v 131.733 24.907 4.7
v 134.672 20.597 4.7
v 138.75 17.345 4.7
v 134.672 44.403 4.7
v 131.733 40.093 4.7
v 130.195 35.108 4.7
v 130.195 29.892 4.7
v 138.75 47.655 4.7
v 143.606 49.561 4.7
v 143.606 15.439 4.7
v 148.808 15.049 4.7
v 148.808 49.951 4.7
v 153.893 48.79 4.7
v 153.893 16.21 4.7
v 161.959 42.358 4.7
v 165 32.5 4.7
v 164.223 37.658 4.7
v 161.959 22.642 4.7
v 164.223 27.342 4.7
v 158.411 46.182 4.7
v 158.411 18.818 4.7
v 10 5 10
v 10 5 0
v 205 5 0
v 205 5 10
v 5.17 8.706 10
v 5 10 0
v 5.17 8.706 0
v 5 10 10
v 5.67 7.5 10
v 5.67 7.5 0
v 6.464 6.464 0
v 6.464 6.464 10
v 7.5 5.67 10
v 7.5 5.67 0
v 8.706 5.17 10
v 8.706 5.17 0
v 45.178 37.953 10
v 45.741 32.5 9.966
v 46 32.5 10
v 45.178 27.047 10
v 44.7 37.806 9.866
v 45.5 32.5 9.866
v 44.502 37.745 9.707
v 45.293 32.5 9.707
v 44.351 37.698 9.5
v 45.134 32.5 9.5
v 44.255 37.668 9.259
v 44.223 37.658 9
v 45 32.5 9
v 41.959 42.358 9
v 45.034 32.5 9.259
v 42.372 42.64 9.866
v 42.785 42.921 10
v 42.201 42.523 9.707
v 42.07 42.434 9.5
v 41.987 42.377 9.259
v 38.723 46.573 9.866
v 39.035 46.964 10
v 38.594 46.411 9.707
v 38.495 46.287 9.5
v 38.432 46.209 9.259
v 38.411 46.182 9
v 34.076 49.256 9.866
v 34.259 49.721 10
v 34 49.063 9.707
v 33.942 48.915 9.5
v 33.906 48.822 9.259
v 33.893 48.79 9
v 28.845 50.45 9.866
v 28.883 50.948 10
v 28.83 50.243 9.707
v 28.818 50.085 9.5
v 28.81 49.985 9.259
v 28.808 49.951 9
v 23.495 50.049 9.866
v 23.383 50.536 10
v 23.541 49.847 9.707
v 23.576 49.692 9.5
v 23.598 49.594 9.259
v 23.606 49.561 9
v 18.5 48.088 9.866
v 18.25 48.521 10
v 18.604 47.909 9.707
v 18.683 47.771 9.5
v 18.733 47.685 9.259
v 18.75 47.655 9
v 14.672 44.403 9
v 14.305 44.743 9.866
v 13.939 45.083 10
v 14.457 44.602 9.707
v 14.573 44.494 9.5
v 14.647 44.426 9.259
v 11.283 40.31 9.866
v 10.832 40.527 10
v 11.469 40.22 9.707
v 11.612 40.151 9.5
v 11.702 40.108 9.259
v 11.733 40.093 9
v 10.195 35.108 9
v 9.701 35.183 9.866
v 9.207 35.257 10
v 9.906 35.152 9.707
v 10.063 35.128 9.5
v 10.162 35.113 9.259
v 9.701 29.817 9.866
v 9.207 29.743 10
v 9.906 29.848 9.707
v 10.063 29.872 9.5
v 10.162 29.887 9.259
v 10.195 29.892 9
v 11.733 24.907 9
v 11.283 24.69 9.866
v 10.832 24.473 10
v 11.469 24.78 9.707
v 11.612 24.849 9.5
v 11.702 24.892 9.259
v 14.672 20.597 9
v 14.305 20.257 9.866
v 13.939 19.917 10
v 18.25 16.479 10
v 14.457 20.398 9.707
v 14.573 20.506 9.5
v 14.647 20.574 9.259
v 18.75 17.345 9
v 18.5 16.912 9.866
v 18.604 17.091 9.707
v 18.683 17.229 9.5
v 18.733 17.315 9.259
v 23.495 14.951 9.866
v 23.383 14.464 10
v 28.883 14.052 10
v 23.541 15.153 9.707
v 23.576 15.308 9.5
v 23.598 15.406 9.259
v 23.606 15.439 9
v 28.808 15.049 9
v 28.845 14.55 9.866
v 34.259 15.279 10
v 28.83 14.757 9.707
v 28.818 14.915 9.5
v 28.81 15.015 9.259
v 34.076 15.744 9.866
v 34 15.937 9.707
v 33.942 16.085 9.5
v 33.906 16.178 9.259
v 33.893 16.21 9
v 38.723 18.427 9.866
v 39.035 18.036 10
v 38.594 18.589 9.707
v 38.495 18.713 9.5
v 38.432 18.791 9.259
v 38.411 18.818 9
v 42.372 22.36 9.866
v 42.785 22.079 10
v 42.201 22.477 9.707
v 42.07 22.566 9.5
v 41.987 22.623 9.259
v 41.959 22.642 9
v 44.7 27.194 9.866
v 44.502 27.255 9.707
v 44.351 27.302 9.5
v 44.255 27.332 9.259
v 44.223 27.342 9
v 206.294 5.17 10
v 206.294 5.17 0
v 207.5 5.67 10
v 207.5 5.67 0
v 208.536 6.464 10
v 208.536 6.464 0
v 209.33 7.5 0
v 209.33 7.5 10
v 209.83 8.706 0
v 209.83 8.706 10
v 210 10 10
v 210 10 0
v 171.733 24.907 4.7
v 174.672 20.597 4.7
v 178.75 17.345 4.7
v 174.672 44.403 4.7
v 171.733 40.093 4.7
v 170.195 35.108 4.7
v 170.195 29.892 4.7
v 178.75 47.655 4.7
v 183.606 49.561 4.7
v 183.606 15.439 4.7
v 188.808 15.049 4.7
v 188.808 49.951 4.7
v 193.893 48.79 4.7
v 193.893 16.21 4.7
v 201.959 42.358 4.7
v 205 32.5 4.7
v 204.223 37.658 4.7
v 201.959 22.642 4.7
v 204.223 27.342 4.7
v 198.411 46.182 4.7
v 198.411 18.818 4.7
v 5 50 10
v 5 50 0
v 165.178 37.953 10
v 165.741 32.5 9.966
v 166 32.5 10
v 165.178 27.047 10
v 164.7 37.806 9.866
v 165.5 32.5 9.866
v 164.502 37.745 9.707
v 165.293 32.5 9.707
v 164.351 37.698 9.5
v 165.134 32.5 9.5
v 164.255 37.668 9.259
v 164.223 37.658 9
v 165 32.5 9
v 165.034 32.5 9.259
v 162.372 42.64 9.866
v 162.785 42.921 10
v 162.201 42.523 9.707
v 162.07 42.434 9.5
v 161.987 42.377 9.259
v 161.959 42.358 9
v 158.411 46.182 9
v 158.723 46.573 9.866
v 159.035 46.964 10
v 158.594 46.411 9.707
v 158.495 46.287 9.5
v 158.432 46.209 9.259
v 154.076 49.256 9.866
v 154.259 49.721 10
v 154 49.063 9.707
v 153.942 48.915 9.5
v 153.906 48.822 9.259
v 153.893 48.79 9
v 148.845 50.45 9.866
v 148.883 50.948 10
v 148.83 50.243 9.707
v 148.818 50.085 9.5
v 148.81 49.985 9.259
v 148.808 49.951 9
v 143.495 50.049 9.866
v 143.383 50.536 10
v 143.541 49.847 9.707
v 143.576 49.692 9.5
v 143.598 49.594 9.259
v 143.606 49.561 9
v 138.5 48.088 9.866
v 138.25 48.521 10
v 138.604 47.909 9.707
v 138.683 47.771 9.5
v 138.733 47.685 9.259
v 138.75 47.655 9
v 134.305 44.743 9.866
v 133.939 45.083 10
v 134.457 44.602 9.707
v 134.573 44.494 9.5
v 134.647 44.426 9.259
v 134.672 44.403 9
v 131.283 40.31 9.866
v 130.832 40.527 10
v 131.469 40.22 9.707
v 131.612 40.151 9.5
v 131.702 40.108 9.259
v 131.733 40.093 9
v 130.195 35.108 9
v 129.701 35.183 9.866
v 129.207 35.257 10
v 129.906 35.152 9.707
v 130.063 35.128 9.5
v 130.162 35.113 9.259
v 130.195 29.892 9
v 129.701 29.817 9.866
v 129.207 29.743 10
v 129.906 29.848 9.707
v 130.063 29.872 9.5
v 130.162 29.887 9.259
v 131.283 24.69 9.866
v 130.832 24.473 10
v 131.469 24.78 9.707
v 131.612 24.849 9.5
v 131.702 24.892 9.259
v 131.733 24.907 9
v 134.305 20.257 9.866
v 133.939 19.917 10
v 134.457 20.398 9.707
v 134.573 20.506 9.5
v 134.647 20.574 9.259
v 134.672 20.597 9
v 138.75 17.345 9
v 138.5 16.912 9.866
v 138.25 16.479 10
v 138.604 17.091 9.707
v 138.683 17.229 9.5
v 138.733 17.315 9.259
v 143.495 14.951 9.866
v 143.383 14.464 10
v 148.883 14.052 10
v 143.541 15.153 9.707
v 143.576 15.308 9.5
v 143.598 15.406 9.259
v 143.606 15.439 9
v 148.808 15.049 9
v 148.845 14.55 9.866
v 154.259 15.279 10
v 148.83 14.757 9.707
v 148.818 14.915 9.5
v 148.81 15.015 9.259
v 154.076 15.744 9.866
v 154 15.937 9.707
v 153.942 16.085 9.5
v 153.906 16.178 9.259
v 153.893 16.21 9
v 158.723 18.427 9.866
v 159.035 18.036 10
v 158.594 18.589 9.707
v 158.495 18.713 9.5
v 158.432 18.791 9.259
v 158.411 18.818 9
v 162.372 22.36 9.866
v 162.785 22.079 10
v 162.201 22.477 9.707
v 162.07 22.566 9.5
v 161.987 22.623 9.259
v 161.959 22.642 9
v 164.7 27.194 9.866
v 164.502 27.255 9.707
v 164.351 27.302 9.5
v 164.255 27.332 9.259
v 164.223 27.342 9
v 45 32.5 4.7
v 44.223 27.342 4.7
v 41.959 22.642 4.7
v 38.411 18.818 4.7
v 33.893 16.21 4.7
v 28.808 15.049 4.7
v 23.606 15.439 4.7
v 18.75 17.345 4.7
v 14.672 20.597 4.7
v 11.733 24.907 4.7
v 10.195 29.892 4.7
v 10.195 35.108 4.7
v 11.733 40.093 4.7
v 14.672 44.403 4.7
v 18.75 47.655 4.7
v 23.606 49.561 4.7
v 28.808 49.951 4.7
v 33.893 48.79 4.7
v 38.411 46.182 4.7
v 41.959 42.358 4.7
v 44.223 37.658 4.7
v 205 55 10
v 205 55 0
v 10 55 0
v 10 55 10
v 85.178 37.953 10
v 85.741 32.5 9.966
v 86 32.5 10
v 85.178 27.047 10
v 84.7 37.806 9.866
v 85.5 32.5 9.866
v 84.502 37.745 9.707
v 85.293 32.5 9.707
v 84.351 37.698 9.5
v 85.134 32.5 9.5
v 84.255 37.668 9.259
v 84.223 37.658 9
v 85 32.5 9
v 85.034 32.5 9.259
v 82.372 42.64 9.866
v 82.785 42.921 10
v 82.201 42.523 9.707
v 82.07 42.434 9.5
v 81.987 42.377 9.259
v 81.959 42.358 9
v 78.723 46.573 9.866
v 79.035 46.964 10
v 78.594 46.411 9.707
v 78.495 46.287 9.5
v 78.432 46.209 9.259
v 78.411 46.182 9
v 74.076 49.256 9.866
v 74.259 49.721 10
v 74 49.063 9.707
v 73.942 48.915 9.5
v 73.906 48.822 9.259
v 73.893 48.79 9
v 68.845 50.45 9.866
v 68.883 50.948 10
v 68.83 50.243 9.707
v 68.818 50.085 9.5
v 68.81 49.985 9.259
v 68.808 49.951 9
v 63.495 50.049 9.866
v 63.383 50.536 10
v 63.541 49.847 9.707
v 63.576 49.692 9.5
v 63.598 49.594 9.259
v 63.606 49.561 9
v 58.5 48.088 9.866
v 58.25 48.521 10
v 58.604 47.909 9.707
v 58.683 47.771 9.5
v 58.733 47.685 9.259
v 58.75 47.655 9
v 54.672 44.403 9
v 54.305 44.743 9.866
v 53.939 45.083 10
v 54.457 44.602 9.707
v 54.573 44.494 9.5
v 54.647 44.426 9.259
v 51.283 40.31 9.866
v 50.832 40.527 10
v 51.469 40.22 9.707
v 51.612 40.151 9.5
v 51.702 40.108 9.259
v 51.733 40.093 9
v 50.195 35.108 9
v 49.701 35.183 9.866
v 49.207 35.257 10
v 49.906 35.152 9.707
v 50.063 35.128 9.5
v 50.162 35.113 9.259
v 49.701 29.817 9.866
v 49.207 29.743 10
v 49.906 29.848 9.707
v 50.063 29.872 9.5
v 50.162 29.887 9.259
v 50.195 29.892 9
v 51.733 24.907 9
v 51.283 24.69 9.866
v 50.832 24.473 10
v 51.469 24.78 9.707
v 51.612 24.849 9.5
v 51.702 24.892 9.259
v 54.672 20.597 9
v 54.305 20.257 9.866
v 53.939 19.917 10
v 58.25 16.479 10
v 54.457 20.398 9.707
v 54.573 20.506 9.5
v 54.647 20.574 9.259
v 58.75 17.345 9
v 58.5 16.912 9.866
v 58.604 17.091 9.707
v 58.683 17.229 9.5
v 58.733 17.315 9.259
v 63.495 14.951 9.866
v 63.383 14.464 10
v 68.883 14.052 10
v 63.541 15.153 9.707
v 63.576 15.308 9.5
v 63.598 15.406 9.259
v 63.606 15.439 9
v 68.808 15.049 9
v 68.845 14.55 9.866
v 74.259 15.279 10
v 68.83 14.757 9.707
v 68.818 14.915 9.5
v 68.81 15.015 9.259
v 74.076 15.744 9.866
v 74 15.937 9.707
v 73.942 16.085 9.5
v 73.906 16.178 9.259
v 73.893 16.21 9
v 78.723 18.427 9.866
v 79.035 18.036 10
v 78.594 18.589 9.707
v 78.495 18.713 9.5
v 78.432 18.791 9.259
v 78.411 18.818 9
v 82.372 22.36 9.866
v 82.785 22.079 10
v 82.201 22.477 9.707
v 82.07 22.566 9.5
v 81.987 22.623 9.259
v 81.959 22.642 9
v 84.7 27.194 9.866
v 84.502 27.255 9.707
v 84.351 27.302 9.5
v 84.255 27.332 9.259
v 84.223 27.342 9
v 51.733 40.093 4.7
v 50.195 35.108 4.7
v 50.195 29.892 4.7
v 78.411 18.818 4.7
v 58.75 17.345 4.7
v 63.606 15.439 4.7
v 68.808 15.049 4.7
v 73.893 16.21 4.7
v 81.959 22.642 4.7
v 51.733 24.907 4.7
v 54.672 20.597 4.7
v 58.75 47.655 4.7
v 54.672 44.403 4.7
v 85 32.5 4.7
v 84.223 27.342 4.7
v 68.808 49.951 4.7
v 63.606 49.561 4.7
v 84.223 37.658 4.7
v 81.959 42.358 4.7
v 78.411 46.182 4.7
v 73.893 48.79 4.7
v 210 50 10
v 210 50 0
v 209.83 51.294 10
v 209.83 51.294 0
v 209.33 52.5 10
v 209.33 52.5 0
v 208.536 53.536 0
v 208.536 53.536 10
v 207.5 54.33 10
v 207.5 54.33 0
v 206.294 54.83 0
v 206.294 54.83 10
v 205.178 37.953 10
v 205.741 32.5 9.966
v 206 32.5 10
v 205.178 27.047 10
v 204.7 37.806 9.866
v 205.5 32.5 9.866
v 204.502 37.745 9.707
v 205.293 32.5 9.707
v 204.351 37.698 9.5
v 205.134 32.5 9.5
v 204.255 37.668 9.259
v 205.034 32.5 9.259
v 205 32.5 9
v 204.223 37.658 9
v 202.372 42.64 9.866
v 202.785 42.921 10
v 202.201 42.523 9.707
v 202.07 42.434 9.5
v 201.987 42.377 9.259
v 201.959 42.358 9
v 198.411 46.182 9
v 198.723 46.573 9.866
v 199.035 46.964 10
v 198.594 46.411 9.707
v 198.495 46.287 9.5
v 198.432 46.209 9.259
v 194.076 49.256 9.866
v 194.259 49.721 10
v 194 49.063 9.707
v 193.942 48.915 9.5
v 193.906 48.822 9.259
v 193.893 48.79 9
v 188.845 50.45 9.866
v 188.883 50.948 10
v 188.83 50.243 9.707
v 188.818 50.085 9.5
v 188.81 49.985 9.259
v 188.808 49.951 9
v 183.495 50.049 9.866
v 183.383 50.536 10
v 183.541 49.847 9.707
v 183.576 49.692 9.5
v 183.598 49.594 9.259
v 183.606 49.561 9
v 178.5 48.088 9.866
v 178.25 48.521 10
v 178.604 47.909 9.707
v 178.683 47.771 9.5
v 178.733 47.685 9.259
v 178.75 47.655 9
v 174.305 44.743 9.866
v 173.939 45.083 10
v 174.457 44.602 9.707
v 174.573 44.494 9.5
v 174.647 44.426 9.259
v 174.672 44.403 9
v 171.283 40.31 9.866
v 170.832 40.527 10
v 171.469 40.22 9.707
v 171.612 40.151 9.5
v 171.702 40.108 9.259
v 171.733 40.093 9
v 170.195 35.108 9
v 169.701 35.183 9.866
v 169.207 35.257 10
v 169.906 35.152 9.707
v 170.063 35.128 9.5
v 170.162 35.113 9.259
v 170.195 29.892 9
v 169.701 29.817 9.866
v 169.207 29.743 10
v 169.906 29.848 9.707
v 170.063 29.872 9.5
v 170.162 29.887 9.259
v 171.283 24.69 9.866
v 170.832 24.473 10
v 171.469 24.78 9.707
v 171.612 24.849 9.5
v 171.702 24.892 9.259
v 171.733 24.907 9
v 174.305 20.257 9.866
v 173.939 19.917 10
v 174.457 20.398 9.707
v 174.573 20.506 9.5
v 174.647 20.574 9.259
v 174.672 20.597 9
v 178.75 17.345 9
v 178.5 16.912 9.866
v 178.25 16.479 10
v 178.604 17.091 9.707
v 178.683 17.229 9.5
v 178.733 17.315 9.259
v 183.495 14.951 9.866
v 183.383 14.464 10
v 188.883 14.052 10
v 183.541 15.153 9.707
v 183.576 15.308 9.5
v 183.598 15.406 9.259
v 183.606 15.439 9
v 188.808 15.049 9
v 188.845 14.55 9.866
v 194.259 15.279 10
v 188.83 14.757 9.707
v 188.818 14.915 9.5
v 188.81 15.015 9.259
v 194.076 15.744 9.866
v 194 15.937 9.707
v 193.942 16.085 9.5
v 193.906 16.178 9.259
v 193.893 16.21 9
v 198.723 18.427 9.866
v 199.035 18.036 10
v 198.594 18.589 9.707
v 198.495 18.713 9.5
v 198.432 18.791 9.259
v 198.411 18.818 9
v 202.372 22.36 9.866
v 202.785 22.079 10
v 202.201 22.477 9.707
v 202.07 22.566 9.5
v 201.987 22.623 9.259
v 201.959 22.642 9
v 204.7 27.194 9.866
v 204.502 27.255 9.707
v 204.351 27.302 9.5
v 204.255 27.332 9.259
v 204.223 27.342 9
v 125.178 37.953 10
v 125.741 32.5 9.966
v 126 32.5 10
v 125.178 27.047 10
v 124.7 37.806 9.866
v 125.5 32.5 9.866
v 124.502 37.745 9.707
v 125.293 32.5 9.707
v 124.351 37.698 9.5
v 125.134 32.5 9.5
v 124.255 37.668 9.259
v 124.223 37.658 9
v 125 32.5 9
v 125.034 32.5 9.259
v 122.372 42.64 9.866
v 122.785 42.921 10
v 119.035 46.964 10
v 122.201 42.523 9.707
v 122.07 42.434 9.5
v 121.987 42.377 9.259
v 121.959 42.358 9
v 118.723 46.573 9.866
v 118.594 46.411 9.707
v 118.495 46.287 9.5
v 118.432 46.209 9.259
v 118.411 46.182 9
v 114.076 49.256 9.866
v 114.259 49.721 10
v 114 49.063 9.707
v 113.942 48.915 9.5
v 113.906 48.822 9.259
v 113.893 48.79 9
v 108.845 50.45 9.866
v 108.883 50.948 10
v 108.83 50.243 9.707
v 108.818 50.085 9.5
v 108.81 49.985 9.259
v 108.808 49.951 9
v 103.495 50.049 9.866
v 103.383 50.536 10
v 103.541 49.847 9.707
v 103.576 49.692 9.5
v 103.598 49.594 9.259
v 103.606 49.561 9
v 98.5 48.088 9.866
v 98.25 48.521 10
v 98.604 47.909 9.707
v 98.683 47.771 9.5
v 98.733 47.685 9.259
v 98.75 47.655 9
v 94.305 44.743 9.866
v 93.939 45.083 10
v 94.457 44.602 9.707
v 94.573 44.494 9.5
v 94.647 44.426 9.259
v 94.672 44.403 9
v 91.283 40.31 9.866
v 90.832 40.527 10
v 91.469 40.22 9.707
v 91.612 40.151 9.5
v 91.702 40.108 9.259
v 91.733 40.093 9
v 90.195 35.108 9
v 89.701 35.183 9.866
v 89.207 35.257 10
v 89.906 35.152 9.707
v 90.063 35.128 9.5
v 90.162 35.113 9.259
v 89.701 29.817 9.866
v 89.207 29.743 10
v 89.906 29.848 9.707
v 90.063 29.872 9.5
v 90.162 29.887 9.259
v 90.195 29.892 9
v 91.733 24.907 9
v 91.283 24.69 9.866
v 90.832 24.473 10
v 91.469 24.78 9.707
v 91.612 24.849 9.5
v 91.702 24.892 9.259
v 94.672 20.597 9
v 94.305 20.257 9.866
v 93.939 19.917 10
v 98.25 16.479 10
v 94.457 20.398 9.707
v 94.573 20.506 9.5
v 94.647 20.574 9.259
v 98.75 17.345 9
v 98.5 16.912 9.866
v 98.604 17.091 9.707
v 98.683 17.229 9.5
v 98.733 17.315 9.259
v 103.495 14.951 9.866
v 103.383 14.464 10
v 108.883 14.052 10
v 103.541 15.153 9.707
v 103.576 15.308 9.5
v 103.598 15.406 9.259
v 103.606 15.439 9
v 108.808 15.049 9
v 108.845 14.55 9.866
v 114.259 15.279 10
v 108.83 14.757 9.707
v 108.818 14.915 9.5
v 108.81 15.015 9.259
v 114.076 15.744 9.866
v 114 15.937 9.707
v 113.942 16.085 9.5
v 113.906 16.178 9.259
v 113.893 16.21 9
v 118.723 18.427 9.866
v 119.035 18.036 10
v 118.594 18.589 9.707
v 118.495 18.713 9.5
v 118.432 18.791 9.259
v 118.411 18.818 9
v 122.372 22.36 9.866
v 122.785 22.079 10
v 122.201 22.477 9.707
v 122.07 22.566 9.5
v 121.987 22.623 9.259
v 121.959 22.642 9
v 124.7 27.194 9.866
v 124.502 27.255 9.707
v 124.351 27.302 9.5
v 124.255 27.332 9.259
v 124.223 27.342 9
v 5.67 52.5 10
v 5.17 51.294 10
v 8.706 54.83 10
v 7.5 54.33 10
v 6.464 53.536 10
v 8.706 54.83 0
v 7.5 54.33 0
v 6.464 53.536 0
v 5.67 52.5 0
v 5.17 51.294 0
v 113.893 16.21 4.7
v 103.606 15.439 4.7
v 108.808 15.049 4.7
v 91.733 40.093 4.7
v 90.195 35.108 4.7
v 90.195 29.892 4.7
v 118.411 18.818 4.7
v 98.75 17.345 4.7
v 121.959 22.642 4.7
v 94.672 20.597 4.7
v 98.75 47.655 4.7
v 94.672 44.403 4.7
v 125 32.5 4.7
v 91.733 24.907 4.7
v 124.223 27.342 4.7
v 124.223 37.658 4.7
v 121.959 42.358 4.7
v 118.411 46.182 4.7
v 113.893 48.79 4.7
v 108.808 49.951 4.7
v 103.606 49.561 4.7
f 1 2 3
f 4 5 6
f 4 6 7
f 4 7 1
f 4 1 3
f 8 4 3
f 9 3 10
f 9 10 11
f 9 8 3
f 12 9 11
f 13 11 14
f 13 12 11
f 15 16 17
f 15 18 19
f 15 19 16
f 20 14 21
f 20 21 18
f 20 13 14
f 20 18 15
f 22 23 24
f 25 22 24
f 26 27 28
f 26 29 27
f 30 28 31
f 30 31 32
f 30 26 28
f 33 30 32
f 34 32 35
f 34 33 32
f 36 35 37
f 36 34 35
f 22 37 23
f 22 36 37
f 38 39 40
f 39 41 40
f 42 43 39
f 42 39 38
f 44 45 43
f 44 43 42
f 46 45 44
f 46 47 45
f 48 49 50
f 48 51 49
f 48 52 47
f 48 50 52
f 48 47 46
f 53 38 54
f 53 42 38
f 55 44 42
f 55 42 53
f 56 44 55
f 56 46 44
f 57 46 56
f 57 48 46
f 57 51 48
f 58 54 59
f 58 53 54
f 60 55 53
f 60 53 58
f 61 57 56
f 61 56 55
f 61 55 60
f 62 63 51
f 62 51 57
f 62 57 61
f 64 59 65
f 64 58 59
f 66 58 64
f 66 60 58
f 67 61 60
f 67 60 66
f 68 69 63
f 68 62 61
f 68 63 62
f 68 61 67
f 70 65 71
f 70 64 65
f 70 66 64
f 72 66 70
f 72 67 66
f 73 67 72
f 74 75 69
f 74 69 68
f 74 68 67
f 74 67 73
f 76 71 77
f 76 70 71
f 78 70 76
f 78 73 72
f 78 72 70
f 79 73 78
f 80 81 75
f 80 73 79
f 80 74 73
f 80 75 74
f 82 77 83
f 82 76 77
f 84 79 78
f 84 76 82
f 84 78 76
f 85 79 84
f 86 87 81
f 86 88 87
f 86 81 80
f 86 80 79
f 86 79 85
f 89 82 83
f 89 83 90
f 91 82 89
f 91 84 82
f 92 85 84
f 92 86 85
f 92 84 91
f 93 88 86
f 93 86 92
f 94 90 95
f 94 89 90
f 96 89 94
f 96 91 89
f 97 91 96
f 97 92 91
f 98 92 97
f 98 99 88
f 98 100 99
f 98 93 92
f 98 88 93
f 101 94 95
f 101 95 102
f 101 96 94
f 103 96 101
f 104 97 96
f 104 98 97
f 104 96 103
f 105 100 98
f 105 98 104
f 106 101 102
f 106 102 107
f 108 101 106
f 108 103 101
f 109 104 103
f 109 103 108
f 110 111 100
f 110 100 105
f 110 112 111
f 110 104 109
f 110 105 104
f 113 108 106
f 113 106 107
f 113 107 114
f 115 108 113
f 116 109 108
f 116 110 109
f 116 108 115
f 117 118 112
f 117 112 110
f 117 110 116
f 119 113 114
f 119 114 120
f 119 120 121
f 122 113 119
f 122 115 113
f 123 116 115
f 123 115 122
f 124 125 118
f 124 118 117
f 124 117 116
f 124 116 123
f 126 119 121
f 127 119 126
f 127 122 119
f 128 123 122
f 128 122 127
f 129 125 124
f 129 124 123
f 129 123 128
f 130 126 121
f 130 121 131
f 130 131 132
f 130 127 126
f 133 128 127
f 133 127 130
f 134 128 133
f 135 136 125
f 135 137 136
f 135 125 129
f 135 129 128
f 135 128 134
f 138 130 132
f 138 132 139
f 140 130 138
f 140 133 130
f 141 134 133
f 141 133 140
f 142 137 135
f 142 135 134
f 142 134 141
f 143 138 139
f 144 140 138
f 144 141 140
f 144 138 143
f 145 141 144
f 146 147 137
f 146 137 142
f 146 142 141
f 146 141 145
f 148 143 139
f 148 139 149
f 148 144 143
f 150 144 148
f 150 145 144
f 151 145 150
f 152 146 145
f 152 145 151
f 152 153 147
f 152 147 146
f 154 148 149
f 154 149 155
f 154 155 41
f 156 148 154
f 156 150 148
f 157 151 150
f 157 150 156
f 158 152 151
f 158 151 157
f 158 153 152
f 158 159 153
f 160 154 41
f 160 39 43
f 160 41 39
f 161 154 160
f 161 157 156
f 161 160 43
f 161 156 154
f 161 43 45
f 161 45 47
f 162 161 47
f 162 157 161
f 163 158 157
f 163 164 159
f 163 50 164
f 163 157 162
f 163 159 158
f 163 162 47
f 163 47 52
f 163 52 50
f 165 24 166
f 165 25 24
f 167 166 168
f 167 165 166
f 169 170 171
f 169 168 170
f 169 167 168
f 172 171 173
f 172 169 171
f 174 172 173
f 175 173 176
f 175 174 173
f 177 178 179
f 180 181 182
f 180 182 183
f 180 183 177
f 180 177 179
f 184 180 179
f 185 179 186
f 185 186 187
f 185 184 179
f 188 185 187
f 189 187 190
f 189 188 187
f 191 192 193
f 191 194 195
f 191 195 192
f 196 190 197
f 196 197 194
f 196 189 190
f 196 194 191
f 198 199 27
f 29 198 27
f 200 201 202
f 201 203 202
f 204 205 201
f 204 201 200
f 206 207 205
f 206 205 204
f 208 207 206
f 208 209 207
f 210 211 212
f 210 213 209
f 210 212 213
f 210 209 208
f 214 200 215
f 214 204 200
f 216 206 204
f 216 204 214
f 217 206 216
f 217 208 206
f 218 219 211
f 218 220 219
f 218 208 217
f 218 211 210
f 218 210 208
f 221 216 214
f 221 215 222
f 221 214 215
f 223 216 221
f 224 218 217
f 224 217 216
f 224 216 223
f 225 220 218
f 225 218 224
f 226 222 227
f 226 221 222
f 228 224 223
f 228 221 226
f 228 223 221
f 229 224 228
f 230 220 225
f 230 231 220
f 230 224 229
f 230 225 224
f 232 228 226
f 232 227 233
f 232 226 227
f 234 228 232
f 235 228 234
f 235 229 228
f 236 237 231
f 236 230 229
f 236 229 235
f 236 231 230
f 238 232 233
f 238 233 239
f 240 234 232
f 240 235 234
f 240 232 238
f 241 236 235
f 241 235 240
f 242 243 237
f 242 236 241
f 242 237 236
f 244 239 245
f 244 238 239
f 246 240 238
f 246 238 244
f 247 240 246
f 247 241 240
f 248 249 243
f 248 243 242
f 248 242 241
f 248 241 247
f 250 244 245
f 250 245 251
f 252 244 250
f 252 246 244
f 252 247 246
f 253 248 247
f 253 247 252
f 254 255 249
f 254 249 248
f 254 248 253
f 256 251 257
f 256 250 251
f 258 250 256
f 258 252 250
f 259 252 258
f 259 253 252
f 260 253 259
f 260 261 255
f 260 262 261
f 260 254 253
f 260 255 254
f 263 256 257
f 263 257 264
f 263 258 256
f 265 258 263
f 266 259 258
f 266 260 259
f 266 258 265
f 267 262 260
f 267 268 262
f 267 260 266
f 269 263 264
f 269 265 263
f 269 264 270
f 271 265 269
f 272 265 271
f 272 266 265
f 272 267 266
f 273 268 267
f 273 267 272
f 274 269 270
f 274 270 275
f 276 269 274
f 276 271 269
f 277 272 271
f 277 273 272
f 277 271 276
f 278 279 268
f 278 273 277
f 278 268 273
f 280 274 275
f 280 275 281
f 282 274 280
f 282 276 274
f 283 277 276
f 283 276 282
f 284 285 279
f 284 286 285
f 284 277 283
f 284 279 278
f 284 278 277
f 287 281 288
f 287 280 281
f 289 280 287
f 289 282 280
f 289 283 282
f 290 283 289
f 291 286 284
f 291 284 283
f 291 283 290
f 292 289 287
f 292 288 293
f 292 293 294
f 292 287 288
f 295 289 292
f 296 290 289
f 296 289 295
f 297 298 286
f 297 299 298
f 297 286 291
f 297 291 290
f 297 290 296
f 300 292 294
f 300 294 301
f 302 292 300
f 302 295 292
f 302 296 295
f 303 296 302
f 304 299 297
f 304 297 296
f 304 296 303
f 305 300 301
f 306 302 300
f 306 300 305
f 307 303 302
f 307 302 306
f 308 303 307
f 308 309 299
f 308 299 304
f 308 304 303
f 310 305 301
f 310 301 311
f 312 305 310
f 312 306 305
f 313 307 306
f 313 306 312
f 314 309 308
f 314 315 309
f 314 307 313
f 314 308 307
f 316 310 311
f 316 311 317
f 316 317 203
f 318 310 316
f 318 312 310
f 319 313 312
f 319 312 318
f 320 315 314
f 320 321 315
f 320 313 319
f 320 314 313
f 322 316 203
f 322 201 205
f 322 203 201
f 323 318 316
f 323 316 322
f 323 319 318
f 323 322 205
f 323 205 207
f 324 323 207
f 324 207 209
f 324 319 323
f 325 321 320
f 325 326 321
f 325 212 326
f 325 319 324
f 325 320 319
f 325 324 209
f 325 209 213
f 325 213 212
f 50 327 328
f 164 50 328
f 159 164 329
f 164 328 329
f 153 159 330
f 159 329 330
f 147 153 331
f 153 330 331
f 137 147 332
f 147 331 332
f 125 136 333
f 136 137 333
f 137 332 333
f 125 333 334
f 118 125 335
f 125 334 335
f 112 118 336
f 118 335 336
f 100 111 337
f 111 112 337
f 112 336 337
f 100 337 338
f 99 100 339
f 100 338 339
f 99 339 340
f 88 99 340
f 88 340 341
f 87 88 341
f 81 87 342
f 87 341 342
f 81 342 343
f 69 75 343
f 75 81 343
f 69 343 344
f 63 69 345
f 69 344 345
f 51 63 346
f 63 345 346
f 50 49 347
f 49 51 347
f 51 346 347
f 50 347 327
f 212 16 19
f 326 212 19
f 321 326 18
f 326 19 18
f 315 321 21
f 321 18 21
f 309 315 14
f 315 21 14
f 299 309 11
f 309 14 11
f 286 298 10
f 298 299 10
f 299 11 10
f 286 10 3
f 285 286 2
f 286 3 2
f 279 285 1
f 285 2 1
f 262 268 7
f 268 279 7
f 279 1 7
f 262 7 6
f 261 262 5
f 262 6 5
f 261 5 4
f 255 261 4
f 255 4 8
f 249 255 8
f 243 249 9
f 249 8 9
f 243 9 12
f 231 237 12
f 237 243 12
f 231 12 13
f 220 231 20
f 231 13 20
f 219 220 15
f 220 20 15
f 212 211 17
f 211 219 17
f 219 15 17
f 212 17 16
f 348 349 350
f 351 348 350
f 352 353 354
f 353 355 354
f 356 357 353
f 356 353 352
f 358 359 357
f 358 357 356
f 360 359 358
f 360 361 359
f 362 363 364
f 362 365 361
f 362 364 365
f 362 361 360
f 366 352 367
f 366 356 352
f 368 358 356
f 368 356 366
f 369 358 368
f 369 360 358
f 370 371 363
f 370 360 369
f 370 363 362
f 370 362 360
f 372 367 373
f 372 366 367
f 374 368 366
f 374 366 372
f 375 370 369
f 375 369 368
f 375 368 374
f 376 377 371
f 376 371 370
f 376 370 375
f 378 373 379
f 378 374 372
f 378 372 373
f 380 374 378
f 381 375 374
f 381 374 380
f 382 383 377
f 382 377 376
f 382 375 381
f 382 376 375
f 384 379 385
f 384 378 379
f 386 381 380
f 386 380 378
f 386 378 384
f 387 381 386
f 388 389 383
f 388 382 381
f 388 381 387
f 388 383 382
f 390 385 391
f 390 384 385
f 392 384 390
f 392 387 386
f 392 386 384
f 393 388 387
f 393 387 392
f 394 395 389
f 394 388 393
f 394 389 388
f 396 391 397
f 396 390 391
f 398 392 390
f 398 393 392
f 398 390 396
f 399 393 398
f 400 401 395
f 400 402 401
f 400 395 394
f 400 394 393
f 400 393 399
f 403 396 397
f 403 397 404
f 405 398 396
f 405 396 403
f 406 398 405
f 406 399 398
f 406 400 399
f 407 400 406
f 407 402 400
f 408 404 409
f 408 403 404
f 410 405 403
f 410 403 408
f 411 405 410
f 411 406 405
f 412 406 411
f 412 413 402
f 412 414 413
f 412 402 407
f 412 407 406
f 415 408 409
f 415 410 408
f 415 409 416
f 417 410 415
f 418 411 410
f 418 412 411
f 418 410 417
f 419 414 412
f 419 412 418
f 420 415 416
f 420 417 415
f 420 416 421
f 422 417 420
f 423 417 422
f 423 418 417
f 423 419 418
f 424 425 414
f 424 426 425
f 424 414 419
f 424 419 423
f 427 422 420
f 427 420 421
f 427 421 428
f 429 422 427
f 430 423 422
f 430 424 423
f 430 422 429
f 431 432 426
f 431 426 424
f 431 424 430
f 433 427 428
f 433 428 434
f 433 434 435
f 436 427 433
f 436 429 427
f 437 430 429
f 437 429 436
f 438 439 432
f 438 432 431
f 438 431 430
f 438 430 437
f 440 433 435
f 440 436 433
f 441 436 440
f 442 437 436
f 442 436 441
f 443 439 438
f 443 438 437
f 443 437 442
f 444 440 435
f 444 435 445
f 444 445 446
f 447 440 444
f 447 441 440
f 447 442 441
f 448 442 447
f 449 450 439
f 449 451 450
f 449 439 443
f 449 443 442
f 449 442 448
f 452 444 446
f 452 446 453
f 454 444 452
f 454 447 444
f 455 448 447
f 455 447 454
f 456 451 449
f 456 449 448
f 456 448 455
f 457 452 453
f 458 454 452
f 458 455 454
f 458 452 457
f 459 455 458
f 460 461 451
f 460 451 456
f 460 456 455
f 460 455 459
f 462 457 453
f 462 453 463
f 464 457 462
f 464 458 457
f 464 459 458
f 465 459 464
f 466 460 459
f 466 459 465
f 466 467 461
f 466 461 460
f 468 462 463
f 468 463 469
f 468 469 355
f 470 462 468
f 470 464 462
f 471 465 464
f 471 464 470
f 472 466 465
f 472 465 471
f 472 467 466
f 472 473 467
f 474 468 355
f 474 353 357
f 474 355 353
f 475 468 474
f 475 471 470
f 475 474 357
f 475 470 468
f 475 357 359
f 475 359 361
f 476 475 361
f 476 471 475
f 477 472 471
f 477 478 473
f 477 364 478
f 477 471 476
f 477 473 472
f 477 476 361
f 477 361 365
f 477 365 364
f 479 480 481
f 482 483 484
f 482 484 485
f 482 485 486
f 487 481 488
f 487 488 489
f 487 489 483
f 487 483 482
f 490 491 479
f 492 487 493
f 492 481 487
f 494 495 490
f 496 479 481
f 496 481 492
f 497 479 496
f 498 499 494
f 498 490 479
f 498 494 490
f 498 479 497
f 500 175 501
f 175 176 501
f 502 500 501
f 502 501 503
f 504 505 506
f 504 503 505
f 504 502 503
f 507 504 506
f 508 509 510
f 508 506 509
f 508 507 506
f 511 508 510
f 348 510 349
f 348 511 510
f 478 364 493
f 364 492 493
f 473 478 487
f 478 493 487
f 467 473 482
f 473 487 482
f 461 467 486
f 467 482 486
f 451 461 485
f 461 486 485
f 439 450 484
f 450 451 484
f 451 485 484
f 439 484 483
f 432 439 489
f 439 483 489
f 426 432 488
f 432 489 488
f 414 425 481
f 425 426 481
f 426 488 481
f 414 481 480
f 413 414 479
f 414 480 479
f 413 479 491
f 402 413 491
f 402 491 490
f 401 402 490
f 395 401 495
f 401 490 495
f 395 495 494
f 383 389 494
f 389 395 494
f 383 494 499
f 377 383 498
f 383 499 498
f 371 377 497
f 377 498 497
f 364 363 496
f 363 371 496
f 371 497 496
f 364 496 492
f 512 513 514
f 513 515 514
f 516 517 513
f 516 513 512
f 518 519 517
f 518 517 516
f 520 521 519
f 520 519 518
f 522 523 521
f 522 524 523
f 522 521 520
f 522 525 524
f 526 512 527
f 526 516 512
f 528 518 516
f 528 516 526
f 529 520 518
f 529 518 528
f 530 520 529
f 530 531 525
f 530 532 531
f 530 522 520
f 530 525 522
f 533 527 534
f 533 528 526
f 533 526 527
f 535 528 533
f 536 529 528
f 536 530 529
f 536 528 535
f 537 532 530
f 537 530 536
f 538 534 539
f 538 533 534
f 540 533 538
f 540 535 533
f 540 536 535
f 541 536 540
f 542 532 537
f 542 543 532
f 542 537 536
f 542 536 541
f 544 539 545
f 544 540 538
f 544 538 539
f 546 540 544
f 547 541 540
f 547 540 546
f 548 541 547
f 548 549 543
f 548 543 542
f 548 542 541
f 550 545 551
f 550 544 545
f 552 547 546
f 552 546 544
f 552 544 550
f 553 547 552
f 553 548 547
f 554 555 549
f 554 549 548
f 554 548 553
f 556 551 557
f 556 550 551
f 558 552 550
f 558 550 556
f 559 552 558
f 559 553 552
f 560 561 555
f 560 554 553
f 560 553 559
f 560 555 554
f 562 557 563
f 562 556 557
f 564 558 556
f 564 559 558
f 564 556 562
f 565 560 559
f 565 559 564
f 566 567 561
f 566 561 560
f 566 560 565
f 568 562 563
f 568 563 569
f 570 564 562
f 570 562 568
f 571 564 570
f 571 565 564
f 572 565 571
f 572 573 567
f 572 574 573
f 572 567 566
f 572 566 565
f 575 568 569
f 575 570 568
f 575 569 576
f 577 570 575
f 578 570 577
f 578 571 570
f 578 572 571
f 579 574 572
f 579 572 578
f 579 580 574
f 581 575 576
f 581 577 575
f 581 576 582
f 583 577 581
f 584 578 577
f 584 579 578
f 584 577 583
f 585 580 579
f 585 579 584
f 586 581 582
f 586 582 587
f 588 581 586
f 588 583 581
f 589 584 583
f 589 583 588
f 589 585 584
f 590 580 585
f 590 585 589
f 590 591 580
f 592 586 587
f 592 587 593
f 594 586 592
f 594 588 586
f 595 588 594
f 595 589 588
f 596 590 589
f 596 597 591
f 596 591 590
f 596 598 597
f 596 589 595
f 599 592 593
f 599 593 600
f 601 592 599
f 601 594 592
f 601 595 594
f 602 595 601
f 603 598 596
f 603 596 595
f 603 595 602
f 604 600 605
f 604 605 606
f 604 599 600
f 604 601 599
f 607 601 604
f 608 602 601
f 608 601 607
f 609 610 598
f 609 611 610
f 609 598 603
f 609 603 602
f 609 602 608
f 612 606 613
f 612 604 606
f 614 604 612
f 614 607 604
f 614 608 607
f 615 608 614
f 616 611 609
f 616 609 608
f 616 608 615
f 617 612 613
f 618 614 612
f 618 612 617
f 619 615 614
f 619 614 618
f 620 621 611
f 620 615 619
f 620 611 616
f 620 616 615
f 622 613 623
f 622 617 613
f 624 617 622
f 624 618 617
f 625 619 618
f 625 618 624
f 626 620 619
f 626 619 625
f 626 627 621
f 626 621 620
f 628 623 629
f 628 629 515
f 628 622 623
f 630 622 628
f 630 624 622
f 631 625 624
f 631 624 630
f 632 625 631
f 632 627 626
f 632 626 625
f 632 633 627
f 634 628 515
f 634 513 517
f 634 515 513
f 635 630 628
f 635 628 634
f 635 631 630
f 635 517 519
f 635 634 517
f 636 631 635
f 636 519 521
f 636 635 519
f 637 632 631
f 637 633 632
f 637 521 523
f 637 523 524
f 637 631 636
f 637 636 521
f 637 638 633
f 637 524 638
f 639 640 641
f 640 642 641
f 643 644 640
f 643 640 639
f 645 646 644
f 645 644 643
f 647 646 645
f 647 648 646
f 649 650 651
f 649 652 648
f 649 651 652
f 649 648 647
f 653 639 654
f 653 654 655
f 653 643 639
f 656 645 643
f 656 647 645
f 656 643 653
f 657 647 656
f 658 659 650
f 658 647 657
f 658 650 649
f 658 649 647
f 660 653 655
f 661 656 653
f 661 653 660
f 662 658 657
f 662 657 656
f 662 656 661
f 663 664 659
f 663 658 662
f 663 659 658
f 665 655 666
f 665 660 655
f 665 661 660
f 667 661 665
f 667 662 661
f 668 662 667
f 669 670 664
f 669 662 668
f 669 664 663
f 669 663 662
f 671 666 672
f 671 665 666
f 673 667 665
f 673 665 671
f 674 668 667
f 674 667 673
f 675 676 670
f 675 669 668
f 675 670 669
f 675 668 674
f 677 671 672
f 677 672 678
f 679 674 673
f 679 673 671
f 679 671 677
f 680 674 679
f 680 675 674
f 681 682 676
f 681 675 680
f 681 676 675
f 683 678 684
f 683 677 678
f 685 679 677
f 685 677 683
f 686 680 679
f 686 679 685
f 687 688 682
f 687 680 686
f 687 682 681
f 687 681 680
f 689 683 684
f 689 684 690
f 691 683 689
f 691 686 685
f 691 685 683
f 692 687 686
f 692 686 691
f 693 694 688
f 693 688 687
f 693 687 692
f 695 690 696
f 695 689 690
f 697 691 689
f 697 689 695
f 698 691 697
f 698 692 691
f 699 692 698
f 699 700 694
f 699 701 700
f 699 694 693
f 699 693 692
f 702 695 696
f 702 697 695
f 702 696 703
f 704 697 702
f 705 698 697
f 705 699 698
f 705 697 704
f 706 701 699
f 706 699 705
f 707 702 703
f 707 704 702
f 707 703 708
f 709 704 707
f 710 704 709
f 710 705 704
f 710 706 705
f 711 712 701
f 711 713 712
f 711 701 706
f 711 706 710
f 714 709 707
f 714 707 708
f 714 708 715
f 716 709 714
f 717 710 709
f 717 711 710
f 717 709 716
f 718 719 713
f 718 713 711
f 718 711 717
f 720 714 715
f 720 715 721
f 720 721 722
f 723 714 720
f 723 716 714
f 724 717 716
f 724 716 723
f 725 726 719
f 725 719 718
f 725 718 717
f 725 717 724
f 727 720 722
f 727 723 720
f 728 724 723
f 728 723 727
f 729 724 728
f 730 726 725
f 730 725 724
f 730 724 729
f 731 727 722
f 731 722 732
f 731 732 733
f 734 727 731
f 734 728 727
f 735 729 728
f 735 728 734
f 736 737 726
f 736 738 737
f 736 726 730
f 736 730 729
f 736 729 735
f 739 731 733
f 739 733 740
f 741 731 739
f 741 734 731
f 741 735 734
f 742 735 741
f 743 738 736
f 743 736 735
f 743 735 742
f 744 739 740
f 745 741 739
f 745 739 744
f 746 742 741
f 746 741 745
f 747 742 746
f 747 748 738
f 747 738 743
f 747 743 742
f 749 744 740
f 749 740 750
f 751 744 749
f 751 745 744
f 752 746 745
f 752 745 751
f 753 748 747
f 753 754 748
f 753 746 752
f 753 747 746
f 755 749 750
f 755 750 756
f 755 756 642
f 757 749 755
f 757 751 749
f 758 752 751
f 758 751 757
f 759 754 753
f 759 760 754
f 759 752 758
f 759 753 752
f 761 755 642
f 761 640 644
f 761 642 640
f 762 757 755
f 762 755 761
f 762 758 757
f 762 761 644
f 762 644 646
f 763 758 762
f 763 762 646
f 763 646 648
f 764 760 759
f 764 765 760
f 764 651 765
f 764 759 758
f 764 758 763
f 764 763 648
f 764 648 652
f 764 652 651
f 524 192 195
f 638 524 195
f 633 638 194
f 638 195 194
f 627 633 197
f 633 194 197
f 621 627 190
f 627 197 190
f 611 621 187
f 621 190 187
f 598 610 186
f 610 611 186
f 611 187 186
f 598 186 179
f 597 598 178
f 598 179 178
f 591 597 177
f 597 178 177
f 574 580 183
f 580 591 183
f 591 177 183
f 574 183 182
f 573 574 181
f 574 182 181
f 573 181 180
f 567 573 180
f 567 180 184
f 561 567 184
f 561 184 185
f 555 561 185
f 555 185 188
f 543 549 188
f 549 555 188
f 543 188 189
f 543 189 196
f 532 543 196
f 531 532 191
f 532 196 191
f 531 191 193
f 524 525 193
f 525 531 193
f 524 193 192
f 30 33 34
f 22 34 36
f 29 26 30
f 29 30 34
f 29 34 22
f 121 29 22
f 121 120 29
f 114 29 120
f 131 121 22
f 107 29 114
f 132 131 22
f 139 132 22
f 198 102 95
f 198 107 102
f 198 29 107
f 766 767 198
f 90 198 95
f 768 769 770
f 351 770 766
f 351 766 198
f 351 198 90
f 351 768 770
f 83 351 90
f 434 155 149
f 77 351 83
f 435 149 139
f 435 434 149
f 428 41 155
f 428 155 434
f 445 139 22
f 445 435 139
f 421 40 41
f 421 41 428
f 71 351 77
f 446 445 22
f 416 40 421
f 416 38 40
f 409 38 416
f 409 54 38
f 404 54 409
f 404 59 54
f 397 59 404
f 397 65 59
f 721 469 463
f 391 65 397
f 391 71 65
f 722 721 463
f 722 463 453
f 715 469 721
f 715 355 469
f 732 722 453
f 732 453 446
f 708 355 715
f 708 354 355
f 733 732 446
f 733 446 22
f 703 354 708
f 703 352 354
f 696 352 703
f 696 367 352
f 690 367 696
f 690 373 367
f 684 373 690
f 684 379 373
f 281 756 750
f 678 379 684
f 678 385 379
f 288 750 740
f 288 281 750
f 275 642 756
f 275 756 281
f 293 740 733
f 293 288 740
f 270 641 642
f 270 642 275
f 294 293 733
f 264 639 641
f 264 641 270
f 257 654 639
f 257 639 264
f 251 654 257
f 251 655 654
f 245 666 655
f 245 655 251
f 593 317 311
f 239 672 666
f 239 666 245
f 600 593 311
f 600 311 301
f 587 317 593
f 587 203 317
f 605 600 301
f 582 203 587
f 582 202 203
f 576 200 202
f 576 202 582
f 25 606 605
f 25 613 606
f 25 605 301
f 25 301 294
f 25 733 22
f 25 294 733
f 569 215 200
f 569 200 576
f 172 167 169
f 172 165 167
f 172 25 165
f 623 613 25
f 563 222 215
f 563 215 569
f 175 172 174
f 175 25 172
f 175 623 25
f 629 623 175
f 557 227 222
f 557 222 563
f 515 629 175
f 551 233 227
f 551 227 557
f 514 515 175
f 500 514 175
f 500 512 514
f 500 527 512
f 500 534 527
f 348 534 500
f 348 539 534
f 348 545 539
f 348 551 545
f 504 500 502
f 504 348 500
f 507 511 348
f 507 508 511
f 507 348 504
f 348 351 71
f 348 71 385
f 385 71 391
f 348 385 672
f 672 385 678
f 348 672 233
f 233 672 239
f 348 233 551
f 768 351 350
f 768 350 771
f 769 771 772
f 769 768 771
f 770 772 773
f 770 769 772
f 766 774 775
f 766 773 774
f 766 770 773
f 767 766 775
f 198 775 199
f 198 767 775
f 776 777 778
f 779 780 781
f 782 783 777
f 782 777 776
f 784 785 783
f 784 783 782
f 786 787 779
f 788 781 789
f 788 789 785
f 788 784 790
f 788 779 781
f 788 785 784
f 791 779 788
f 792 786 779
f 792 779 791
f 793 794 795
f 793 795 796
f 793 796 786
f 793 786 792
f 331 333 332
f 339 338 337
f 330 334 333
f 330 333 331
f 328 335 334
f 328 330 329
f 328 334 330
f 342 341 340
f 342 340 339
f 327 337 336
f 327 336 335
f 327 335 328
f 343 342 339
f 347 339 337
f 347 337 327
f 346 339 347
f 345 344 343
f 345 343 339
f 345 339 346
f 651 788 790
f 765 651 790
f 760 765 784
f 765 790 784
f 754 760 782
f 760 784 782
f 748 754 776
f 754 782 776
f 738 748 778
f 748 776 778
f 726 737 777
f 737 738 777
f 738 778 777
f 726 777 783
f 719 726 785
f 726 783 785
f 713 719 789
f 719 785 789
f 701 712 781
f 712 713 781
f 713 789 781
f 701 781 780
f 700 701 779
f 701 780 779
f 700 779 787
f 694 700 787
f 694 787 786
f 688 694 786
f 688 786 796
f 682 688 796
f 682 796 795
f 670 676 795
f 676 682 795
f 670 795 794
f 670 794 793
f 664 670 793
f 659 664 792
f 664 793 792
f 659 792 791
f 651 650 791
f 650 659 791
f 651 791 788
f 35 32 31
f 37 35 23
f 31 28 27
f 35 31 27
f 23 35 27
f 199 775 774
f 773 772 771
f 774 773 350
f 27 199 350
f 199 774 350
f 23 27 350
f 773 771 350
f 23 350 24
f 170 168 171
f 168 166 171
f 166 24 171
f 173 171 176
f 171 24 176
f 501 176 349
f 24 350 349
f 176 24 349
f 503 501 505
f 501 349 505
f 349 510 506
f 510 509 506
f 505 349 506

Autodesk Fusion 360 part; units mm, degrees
sketch "Sketch1" plane through (0, 0, 0) normal (0, 0, 1) x (1, 0, 0)
  line L0 (0, 0) -> (235, 0)
  line L1 (235, 0) -> (235, 55)
  line L2 (235, 55) -> (0, 55)
  line L3 (0, 55) -> (0, 0)
  circle A0 centre (27.5, 32.5) radius 17.5
  circle A1 centre (67.5, 32.5) radius 17.5
  circle A2 centre (107.5, 32.5) radius 17.5
  circle A3 centre (147.5, 32.5) radius 17.5
  circle A4 centre (187.5, 32.5) radius 17.5
  dimension "d1" = 235
  dimension "d2" = 55
  dimension "d9" = 35
  dimension "d10" = 35
  dimension "d11" = 35
  dimension "d12" = 35
  dimension "d13" = 35
extrude "Extrude1" add sketch "Sketch1" along normal blind 10
extrude "Extrude2" add sketch "Sketch1" along normal blind 4.7 contours A0 | A1 | A2 | A3 | A4
extrude "Extrude3" cut 1 faces at (235, 18.3333, 3.3333) along direction (-1, 0, 0) blind 20
extrude "Extrude4" cut 1 faces at (215, 18.3333, 3.3333) along direction (-1, 0, 0) blind 5
extrude "Extrude5" cut 1 faces at (0, 36.6667, 3.3333) along direction (1, 0, 0) blind 5
extrude "Extrude6" cut 1 faces at (73.3333, 0, 3.3333) along direction (0, 1, 0) blind 5
fillet "Fillet3" radius 1 5 edges at (11.1843, 38.8283, 10) (51.1843, 38.8283, 10) (91.1843, 38.8283, 10) (131.1843, 38.8283, 10) (171.1843, 38.8283, 10)
fillet "Fillet4" radius 5 4 edges at (210, 5, 5) (5, 5, 5) (5, 55, 5) (210, 55, 5)
